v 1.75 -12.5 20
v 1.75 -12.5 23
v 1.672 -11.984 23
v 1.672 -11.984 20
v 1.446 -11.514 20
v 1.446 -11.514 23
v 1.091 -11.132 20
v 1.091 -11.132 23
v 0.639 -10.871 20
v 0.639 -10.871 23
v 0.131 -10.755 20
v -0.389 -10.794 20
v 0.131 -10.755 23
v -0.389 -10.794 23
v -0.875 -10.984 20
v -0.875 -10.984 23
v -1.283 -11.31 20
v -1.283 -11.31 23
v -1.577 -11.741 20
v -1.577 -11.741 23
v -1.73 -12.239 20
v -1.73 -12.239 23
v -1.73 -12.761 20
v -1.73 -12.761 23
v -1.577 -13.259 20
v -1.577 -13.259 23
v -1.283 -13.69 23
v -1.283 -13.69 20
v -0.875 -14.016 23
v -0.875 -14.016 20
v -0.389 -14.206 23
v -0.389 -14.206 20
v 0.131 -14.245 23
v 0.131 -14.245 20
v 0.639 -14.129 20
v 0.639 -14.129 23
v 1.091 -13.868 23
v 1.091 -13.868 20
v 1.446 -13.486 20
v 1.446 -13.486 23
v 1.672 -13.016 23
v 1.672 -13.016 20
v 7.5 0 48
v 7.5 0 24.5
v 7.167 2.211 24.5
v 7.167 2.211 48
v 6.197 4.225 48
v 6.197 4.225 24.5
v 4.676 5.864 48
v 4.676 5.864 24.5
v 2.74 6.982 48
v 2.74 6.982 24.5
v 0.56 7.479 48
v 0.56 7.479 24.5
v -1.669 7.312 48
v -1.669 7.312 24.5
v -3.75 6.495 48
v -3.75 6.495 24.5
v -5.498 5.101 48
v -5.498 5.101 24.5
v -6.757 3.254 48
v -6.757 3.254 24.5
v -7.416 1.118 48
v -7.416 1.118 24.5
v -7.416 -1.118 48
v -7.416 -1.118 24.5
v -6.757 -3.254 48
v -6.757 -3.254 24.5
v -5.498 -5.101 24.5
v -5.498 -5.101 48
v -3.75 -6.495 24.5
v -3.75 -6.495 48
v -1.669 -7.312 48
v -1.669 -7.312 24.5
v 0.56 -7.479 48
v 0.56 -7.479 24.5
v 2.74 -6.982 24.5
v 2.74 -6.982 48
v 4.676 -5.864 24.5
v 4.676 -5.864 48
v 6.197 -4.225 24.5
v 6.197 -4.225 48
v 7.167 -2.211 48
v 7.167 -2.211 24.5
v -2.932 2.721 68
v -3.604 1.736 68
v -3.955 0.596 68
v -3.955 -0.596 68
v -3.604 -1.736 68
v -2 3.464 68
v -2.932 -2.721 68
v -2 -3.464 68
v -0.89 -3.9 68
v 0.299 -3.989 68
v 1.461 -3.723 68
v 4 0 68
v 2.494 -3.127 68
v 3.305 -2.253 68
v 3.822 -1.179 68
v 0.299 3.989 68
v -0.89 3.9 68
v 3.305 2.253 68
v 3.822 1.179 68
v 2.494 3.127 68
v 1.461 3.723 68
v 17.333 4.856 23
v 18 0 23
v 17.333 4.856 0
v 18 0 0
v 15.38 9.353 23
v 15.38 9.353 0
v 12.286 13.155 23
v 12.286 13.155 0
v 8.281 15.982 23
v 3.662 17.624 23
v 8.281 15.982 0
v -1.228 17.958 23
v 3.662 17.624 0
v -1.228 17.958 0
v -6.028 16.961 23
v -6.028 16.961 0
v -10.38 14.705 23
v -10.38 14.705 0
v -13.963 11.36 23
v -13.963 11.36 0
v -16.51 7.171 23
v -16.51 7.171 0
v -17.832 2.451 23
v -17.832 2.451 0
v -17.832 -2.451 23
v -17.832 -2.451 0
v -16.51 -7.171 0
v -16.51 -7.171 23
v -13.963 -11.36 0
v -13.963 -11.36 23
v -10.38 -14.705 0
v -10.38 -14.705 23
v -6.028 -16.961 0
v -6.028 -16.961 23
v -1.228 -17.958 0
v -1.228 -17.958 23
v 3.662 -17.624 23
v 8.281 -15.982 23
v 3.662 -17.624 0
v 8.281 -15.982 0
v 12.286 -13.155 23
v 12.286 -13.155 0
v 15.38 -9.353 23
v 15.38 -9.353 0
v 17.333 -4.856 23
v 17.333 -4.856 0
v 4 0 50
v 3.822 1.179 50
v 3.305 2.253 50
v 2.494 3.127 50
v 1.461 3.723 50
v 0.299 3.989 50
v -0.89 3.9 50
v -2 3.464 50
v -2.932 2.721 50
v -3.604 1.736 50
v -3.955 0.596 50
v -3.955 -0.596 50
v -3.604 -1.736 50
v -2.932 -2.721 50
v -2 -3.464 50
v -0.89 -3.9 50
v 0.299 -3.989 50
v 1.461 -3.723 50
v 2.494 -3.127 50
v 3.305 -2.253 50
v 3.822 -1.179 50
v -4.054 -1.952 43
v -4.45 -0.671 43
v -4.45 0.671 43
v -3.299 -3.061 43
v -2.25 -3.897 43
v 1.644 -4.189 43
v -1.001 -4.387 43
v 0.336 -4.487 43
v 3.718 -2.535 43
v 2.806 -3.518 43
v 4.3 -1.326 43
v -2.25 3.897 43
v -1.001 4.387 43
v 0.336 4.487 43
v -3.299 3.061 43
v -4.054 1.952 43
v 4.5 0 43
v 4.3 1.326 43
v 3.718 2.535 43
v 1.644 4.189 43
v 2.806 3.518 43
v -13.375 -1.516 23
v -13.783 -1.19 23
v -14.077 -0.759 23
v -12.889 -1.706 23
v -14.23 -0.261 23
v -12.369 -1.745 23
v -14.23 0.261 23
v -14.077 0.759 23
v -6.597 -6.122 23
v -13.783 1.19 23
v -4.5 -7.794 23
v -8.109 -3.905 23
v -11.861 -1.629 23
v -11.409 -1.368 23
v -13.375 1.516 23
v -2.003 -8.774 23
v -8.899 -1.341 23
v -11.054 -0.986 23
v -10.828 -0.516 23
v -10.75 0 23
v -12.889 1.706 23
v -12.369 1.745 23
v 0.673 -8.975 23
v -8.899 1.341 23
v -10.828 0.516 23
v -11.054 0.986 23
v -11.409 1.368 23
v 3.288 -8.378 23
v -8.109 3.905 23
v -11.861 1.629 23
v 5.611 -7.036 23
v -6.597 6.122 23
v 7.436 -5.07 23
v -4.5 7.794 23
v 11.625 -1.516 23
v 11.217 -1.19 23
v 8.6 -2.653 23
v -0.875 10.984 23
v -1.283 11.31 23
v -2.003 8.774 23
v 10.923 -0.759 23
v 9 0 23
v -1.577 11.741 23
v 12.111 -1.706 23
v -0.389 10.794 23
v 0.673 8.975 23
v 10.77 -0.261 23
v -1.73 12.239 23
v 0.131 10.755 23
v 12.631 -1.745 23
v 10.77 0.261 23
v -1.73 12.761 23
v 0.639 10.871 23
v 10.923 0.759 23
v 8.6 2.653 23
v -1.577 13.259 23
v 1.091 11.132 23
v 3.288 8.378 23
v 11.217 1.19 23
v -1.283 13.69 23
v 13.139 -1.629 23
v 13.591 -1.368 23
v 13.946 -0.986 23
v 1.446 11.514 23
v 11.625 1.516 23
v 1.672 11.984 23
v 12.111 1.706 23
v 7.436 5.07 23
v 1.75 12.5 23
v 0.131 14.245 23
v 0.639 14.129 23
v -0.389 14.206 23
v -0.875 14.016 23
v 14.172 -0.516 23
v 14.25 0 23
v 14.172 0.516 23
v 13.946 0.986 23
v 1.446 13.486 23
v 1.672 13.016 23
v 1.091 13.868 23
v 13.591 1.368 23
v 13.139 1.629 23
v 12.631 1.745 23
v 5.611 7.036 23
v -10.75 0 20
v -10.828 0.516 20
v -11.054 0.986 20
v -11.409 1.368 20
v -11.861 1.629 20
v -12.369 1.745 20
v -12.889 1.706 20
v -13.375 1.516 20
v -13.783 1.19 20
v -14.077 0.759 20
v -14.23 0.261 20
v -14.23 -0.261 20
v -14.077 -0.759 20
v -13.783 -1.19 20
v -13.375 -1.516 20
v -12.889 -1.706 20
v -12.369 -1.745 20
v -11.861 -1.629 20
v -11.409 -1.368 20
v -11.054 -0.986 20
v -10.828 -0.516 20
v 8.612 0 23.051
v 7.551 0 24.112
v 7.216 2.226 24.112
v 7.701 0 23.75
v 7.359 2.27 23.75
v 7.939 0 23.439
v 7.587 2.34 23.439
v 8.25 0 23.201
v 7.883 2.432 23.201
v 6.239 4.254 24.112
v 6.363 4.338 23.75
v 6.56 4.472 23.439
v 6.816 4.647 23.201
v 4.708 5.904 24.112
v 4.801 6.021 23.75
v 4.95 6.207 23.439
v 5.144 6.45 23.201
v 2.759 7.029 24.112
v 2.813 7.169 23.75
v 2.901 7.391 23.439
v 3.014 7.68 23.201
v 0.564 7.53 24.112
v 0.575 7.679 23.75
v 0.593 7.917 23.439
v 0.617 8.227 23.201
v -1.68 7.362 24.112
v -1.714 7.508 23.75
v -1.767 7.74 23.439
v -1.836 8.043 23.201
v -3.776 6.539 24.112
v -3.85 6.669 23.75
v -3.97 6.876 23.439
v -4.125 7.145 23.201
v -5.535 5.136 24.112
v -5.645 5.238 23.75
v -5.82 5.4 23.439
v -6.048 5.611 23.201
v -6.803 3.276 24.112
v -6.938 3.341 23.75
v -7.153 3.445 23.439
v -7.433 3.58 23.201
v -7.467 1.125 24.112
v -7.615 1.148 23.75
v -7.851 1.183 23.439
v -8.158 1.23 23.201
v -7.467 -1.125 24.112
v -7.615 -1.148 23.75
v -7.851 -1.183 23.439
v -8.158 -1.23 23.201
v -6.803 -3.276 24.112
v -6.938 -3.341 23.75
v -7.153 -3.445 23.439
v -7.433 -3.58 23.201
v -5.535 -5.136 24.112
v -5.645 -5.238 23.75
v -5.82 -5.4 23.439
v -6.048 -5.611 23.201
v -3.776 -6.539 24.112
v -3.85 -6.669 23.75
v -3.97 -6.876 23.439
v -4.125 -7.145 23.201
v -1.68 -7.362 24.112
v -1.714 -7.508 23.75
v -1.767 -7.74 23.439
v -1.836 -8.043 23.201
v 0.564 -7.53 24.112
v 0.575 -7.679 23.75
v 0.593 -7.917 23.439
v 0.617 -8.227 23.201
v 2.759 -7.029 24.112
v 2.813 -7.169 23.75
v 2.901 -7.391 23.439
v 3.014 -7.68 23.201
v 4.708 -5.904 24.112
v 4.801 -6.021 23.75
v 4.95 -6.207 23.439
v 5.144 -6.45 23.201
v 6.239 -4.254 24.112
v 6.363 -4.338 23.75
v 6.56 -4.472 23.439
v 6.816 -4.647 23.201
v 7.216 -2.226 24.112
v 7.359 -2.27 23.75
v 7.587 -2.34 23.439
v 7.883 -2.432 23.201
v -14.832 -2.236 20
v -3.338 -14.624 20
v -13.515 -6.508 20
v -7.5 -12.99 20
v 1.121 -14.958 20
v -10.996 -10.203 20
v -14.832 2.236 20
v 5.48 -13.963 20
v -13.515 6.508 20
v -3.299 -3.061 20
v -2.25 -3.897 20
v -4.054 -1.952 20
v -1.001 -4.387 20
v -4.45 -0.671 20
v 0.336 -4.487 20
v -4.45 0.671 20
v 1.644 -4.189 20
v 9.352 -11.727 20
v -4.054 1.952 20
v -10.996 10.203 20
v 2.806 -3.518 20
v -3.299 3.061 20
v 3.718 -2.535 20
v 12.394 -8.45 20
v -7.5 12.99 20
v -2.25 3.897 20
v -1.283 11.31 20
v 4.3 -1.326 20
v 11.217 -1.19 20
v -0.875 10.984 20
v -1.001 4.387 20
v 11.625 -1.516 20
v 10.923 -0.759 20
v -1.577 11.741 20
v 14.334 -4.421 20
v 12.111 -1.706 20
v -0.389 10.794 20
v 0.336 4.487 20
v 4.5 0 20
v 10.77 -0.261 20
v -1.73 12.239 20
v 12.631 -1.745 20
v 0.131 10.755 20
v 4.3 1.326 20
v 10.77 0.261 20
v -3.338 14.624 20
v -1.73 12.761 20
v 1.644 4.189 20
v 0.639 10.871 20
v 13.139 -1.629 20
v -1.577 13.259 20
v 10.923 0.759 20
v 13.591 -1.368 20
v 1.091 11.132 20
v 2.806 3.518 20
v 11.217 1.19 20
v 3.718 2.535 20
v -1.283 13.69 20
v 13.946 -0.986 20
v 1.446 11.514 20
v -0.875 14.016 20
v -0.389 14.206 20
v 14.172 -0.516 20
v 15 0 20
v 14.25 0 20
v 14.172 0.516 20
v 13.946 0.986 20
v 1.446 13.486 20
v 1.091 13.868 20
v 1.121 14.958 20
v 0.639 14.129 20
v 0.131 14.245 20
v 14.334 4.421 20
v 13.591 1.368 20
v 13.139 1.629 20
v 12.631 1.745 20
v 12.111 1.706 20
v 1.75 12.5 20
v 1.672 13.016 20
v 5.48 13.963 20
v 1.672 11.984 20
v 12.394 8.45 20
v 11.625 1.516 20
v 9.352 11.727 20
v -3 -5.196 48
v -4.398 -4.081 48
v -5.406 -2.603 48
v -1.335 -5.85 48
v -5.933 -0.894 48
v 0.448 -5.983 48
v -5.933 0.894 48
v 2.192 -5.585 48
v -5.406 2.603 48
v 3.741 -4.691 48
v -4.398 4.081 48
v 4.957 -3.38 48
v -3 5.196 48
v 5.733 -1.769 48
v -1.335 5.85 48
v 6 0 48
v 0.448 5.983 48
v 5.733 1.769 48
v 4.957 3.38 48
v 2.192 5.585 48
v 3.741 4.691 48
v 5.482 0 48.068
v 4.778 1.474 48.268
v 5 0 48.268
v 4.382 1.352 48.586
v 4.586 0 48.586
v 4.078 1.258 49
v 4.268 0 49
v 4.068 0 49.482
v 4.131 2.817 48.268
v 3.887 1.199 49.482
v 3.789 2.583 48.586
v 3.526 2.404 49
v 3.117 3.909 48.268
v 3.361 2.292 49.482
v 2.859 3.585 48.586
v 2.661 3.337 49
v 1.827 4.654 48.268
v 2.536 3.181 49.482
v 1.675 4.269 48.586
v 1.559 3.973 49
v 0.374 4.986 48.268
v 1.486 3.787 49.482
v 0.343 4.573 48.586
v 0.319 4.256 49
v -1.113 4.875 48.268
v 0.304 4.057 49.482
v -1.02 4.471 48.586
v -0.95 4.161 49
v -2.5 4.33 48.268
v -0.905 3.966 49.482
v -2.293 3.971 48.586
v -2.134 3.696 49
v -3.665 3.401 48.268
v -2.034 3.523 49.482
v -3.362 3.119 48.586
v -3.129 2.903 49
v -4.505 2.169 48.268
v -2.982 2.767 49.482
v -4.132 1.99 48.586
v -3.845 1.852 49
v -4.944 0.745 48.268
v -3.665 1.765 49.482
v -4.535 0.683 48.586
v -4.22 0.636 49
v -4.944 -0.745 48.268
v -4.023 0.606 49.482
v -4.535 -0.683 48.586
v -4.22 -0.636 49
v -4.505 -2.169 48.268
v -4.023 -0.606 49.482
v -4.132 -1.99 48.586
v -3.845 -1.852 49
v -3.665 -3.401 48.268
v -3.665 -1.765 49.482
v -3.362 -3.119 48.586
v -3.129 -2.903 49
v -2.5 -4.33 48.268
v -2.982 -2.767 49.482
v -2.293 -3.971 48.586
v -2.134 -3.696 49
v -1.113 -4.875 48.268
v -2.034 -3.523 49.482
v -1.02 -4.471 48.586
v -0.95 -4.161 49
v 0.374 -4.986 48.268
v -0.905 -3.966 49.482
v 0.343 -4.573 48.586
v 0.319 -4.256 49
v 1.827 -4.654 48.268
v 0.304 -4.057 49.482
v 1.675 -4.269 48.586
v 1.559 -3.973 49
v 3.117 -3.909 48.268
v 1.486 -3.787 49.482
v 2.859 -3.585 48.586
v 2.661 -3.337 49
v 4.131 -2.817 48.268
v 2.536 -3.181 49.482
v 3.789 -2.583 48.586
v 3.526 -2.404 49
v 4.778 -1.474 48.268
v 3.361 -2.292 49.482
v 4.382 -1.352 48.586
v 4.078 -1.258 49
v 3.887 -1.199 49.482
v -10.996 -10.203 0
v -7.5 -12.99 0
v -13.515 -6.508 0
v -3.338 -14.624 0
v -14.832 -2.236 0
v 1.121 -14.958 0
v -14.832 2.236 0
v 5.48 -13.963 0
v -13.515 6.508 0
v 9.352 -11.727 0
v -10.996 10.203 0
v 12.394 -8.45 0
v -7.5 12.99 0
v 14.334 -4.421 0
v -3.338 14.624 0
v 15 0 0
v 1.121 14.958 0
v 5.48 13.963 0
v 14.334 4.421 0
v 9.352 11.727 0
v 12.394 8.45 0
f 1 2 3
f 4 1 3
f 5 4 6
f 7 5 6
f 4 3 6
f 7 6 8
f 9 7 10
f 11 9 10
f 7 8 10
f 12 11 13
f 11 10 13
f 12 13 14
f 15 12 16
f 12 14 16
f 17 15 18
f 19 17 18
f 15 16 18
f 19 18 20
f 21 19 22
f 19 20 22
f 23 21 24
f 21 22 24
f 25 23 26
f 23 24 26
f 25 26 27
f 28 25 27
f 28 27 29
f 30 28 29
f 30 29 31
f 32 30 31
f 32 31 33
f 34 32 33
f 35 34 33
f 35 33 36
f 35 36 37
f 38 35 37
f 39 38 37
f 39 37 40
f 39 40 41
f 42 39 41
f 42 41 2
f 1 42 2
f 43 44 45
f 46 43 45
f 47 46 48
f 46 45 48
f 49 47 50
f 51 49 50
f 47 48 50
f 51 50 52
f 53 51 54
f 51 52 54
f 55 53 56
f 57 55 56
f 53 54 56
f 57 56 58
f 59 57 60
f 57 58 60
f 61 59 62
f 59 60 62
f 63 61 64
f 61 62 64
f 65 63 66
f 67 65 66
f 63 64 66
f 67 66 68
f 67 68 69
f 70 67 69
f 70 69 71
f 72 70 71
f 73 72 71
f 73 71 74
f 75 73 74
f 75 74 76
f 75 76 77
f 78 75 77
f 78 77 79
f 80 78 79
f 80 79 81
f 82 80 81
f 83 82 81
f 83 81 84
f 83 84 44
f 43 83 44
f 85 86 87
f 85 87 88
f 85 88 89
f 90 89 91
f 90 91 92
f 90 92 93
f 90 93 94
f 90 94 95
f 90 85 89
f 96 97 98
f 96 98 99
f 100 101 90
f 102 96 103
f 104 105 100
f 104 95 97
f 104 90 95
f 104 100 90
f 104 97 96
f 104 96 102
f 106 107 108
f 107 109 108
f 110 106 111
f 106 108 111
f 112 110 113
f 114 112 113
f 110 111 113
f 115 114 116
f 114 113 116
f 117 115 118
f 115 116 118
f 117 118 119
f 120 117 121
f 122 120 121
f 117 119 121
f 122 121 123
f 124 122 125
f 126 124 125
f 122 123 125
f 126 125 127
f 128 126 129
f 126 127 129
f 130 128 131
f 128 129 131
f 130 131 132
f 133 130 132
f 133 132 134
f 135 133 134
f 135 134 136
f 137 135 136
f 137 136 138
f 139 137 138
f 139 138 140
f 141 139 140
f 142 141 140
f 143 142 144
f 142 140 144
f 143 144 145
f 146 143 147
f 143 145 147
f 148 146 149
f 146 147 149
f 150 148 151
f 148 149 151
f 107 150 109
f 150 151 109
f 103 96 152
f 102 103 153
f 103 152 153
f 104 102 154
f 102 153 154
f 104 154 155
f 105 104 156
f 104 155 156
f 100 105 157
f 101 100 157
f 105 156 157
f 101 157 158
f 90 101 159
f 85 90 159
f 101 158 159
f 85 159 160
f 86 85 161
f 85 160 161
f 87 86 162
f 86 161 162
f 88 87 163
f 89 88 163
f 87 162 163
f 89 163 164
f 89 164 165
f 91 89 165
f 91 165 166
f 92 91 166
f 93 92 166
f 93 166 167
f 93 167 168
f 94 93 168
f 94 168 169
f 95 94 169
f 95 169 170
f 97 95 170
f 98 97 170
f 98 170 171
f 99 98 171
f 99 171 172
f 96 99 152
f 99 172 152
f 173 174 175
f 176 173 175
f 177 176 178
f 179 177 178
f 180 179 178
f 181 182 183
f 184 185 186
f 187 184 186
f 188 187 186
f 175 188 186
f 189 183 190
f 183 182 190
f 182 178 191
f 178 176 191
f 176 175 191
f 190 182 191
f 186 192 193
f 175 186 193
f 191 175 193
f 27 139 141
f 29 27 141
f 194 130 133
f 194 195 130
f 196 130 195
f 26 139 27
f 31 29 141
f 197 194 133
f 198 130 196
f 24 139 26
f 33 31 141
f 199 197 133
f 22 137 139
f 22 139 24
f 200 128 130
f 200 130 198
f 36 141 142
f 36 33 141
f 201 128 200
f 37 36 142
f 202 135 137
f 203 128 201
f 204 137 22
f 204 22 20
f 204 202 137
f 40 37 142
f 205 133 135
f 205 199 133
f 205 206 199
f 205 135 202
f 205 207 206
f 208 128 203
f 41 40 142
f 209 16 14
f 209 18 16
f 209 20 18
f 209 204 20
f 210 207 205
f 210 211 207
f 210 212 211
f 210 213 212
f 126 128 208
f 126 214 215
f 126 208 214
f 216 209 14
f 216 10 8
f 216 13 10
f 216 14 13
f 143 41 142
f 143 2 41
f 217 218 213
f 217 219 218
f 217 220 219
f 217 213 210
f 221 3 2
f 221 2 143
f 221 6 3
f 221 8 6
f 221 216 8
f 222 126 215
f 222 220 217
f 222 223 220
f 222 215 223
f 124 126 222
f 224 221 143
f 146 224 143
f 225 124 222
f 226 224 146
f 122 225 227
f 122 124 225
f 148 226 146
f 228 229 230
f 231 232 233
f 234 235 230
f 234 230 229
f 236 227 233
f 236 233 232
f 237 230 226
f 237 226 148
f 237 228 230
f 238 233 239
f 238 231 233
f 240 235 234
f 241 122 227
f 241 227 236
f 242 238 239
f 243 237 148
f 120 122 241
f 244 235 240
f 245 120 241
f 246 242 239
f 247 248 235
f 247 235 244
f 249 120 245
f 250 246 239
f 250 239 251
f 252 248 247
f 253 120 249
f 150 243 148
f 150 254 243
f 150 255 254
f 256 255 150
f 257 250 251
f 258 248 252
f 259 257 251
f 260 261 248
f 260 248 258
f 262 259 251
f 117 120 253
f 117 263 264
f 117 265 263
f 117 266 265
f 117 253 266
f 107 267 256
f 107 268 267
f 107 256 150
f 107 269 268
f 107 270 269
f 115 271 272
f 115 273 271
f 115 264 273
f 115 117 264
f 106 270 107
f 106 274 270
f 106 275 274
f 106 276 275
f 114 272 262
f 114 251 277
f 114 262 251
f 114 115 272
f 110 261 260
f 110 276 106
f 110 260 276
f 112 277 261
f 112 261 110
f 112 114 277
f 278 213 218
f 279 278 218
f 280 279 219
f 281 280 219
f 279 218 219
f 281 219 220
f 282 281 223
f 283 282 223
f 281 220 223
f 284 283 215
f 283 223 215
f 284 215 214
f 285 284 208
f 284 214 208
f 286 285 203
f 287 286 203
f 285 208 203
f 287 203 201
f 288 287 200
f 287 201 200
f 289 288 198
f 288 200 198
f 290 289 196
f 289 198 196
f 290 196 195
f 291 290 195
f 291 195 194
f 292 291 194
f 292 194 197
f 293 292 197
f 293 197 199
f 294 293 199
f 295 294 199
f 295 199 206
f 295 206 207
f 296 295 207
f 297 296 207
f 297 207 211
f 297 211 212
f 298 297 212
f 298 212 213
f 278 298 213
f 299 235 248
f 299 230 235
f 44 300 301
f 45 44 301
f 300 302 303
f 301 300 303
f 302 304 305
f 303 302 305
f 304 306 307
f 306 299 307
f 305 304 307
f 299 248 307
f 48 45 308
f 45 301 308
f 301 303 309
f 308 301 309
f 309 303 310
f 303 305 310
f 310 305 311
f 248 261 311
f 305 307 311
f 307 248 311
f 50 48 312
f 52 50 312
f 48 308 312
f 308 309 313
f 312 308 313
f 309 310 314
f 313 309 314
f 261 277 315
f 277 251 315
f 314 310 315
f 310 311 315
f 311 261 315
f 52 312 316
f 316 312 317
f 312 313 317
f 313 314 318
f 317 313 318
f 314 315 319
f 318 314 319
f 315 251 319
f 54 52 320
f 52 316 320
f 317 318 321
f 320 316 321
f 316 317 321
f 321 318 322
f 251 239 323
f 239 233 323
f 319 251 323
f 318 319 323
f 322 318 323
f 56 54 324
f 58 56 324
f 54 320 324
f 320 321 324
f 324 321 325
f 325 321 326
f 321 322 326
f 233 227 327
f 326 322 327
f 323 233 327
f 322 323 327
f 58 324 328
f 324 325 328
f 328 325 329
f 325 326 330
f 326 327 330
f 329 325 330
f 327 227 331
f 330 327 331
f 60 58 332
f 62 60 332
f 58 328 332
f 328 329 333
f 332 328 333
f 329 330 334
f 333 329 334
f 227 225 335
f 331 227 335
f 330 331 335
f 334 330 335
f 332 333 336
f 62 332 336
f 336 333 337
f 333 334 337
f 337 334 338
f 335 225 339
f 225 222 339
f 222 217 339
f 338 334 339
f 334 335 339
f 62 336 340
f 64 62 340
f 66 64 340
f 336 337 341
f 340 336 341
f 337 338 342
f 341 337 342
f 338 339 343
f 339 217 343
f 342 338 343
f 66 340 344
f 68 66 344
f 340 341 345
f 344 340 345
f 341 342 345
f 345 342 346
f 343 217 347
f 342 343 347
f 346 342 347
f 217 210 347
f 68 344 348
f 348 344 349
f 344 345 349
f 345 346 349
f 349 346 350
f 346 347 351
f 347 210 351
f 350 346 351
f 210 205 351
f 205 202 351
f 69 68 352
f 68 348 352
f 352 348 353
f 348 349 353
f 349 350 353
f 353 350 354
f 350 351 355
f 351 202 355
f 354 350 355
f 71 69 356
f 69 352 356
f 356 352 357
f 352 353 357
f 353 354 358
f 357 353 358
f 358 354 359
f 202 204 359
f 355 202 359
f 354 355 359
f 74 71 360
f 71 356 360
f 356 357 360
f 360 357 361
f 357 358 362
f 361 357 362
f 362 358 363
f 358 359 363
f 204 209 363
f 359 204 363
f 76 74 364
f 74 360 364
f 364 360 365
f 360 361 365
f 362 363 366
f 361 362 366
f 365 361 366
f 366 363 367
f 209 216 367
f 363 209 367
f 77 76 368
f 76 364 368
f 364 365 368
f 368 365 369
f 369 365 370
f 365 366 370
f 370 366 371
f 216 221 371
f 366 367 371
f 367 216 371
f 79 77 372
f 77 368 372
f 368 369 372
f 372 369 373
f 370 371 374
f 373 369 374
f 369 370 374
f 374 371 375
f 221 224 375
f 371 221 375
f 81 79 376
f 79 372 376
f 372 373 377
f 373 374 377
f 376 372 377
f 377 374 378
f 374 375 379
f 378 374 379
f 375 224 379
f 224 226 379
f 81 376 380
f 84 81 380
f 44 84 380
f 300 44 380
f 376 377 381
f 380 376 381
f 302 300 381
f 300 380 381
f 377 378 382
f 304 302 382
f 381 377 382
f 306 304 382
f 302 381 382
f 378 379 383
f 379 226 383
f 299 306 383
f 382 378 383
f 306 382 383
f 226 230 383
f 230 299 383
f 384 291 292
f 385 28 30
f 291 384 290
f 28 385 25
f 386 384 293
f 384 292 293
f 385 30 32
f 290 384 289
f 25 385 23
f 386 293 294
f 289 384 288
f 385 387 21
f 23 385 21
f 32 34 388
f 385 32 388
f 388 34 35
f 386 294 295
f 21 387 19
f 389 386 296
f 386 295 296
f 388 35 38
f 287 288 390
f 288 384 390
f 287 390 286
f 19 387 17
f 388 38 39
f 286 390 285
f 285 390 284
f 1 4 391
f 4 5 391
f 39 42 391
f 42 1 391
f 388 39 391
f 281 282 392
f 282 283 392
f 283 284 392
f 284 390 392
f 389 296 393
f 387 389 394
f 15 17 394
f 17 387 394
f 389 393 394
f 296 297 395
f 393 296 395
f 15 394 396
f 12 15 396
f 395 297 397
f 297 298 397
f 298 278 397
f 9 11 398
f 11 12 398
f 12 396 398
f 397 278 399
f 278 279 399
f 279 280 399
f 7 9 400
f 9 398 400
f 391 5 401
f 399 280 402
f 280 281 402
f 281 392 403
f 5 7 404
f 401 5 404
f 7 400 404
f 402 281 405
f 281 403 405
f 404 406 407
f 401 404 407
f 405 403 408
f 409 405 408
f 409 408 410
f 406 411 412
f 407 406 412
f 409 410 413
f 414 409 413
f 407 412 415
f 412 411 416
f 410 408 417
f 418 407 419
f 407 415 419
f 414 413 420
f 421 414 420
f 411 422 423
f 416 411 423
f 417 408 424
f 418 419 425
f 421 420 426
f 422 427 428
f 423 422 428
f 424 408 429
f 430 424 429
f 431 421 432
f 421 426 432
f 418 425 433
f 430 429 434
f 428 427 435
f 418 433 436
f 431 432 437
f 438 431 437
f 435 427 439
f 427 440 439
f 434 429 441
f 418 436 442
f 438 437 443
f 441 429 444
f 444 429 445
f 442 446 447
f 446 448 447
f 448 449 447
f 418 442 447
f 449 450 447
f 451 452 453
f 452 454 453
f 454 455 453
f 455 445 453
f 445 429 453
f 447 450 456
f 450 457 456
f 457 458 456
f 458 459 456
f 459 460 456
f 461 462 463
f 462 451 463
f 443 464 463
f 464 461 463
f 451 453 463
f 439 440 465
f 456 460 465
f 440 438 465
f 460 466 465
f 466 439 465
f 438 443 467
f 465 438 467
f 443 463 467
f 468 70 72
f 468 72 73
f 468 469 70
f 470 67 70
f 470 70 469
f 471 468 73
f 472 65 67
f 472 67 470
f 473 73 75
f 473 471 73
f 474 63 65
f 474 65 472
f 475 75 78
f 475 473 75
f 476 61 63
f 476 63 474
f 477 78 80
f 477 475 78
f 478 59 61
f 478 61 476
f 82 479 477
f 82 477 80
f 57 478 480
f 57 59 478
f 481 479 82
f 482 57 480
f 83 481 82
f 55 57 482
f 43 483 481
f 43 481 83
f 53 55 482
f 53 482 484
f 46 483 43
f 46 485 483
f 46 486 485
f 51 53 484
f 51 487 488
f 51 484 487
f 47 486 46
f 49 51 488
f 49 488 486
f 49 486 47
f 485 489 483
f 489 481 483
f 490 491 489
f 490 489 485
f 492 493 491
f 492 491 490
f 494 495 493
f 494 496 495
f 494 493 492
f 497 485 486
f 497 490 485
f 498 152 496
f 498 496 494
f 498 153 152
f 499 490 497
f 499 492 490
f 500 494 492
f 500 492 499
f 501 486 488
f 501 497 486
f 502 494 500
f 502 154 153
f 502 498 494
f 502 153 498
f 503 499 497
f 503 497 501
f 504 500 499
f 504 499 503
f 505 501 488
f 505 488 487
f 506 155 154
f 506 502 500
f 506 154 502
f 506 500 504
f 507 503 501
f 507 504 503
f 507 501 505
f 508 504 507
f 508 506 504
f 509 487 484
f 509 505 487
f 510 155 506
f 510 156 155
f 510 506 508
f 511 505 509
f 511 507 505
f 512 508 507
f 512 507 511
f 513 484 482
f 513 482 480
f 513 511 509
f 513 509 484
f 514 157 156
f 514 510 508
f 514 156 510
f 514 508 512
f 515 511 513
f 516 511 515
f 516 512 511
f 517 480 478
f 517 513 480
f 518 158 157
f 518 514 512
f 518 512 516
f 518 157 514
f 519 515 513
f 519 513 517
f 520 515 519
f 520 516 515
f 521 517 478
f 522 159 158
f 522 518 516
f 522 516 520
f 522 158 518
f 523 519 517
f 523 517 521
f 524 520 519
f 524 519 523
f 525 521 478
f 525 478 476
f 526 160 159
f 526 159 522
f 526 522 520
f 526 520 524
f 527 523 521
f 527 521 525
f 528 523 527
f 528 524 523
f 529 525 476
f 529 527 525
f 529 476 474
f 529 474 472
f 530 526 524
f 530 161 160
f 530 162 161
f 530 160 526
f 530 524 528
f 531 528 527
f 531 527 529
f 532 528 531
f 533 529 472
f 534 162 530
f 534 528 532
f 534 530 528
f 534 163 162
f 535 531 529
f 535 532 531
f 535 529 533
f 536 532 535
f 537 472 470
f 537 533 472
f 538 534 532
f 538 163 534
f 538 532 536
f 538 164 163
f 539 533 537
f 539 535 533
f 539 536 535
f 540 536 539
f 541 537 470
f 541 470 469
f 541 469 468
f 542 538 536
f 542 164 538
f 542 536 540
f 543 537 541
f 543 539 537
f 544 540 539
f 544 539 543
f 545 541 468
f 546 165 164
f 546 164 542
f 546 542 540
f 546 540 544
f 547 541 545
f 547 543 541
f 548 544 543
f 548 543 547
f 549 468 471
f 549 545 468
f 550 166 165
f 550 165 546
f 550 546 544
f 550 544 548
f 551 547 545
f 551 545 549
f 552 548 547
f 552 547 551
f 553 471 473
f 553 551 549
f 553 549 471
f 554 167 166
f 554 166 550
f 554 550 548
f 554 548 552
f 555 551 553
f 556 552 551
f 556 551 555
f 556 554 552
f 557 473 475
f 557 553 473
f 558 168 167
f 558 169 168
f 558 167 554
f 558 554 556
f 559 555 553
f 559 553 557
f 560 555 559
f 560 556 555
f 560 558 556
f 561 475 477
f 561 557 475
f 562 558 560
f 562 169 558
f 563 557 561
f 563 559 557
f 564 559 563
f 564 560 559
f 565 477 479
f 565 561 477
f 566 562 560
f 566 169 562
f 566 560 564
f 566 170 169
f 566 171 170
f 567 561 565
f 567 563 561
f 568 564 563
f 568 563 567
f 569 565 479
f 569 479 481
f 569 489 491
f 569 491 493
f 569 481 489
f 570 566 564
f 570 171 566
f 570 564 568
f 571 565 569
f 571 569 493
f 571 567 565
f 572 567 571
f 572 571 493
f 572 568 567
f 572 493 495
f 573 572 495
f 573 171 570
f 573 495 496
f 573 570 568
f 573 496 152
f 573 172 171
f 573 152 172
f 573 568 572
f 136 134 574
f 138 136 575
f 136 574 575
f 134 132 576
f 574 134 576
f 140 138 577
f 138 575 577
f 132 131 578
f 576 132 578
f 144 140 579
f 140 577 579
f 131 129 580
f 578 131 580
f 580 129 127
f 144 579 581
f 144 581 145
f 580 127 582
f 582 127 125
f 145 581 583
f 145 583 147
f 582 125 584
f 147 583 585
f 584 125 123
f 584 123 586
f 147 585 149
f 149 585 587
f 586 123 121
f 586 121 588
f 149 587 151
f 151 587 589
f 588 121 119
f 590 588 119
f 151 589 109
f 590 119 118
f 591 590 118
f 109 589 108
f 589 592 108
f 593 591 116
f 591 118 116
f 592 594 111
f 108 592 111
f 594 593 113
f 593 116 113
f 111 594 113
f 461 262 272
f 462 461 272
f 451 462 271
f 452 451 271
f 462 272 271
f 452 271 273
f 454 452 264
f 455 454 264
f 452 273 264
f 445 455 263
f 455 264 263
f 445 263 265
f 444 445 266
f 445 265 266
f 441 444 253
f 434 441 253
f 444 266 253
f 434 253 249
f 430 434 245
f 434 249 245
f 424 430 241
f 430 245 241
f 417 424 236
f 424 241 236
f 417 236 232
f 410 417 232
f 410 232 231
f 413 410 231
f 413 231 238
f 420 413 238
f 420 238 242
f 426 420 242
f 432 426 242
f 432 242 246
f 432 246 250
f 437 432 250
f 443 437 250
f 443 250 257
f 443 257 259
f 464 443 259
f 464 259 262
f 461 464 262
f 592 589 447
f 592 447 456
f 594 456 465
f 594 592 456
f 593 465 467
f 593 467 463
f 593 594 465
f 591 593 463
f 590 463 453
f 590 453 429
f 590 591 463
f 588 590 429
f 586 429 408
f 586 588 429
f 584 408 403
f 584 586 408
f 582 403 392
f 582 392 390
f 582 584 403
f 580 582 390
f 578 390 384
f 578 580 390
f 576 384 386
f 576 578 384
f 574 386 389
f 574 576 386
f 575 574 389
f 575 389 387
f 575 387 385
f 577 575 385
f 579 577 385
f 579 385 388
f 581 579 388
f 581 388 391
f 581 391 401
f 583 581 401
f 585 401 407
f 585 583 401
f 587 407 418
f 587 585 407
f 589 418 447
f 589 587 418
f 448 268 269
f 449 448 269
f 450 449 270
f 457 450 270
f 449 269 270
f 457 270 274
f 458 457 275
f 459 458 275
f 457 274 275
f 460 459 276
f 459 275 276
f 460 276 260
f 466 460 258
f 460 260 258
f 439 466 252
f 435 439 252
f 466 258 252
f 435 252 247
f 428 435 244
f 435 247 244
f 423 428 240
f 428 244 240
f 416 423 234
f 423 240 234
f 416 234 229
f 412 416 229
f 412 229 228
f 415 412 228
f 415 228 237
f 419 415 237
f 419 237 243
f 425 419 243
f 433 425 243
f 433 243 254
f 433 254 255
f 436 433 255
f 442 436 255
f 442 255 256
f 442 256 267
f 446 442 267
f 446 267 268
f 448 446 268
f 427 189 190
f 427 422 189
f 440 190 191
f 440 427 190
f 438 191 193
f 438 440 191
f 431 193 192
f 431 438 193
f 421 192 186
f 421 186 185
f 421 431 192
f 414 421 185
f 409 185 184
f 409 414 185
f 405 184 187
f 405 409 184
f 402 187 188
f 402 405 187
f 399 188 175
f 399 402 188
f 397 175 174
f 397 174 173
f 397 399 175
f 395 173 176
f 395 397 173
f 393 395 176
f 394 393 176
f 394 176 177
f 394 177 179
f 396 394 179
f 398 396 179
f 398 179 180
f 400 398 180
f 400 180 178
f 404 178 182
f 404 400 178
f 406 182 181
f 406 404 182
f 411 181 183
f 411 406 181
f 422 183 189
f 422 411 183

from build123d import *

# Parameters (mm, degrees)
SKETCH_1_R          = 18
SKETCH_1_R_2        = 15
EXTRUDE_1_DEPTH     = 20
SKETCH_2_R          = 18
EXTRUDE_2_DEPTH     = 3
SKETCH_3_R          = 7.5
SKETCH_3_R_2        = 4.5
EXTRUDE_3_DEPTH     = 20
CUT_EXTRUDE_START   = -20
SKETCH_4_R          = 4.5
CUT_EXTRUDE_1_DEPTH = 20
SKETCH_5_R          = 7.5
EXTRUDE_4_DEPTH     = 5
SKETCH_6_R          = 4
EXTRUDE_5_DEPTH     = 20
SKETCH_7_R          = 1.75
CUT_EXTRUDE_2_DEPTH = 15
FILLET_1_R          = 2
FILLET_2_R          = 1.5


with BuildPart() as part:
    # 草图1 → 凸台-拉伸1 (new body)
    with BuildSketch(Plane.XY):
        Circle(SKETCH_1_R)
        Circle(SKETCH_1_R_2, mode=Mode.SUBTRACT)
    extrude(amount=EXTRUDE_1_DEPTH)

    # 草图2 → 凸台-拉伸2 (add)
    with BuildSketch(Plane.XY.offset(20)):
        Circle(SKETCH_2_R)
    extrude(amount=EXTRUDE_2_DEPTH)

    # 草图3 → 凸台-拉伸3 (add)
    with BuildSketch(Plane.XY.offset(23)):
        Circle(SKETCH_3_R)
        Circle(SKETCH_3_R_2, mode=Mode.SUBTRACT)
    extrude(amount=EXTRUDE_3_DEPTH)

    # 草图4 → 切除-拉伸1 (cut)
    with BuildSketch(Plane.XY.offset(23).offset(CUT_EXTRUDE_START)):
        Circle(SKETCH_4_R)
    extrude(amount=CUT_EXTRUDE_1_DEPTH, mode=Mode.SUBTRACT)

    # 草图5 → 凸台-拉伸4 (add)
    with BuildSketch(Plane.XY.offset(43)):
        Circle(SKETCH_5_R)
    extrude(amount=EXTRUDE_4_DEPTH)

    # 草图6 → 凸台-拉伸5 (add)
    with BuildSketch(Plane.XY.offset(48)):
        Circle(SKETCH_6_R)
    extrude(amount=EXTRUDE_5_DEPTH)

    # 草图7 → 切除-拉伸2 (cut)
    with BuildSketch(Plane.XY.offset(23)):
        with Locations((0, 12.5)):
            Circle(SKETCH_7_R)
        with Locations((12.5, 0)):
            Circle(SKETCH_7_R)
        with Locations((0, -12.5)):
            Circle(SKETCH_7_R)
        with Locations((-12.5, 0)):
            Circle(SKETCH_7_R)
    extrude(amount=-CUT_EXTRUDE_2_DEPTH, mode=Mode.SUBTRACT)

    # 圆角1
    fillet_1_edges = [part.edges().sort_by_distance(p)[0] for p in [
        (-4, 0, 48),
    ]]
    fillet(fillet_1_edges, radius=FILLET_1_R)

    # 圆角2
    fillet_2_edges = [part.edges().sort_by_distance(p)[0] for p in [
        (-7.5, 0, 23),
    ]]
    fillet(fillet_2_edges, radius=FILLET_2_R)


solid = part.part
